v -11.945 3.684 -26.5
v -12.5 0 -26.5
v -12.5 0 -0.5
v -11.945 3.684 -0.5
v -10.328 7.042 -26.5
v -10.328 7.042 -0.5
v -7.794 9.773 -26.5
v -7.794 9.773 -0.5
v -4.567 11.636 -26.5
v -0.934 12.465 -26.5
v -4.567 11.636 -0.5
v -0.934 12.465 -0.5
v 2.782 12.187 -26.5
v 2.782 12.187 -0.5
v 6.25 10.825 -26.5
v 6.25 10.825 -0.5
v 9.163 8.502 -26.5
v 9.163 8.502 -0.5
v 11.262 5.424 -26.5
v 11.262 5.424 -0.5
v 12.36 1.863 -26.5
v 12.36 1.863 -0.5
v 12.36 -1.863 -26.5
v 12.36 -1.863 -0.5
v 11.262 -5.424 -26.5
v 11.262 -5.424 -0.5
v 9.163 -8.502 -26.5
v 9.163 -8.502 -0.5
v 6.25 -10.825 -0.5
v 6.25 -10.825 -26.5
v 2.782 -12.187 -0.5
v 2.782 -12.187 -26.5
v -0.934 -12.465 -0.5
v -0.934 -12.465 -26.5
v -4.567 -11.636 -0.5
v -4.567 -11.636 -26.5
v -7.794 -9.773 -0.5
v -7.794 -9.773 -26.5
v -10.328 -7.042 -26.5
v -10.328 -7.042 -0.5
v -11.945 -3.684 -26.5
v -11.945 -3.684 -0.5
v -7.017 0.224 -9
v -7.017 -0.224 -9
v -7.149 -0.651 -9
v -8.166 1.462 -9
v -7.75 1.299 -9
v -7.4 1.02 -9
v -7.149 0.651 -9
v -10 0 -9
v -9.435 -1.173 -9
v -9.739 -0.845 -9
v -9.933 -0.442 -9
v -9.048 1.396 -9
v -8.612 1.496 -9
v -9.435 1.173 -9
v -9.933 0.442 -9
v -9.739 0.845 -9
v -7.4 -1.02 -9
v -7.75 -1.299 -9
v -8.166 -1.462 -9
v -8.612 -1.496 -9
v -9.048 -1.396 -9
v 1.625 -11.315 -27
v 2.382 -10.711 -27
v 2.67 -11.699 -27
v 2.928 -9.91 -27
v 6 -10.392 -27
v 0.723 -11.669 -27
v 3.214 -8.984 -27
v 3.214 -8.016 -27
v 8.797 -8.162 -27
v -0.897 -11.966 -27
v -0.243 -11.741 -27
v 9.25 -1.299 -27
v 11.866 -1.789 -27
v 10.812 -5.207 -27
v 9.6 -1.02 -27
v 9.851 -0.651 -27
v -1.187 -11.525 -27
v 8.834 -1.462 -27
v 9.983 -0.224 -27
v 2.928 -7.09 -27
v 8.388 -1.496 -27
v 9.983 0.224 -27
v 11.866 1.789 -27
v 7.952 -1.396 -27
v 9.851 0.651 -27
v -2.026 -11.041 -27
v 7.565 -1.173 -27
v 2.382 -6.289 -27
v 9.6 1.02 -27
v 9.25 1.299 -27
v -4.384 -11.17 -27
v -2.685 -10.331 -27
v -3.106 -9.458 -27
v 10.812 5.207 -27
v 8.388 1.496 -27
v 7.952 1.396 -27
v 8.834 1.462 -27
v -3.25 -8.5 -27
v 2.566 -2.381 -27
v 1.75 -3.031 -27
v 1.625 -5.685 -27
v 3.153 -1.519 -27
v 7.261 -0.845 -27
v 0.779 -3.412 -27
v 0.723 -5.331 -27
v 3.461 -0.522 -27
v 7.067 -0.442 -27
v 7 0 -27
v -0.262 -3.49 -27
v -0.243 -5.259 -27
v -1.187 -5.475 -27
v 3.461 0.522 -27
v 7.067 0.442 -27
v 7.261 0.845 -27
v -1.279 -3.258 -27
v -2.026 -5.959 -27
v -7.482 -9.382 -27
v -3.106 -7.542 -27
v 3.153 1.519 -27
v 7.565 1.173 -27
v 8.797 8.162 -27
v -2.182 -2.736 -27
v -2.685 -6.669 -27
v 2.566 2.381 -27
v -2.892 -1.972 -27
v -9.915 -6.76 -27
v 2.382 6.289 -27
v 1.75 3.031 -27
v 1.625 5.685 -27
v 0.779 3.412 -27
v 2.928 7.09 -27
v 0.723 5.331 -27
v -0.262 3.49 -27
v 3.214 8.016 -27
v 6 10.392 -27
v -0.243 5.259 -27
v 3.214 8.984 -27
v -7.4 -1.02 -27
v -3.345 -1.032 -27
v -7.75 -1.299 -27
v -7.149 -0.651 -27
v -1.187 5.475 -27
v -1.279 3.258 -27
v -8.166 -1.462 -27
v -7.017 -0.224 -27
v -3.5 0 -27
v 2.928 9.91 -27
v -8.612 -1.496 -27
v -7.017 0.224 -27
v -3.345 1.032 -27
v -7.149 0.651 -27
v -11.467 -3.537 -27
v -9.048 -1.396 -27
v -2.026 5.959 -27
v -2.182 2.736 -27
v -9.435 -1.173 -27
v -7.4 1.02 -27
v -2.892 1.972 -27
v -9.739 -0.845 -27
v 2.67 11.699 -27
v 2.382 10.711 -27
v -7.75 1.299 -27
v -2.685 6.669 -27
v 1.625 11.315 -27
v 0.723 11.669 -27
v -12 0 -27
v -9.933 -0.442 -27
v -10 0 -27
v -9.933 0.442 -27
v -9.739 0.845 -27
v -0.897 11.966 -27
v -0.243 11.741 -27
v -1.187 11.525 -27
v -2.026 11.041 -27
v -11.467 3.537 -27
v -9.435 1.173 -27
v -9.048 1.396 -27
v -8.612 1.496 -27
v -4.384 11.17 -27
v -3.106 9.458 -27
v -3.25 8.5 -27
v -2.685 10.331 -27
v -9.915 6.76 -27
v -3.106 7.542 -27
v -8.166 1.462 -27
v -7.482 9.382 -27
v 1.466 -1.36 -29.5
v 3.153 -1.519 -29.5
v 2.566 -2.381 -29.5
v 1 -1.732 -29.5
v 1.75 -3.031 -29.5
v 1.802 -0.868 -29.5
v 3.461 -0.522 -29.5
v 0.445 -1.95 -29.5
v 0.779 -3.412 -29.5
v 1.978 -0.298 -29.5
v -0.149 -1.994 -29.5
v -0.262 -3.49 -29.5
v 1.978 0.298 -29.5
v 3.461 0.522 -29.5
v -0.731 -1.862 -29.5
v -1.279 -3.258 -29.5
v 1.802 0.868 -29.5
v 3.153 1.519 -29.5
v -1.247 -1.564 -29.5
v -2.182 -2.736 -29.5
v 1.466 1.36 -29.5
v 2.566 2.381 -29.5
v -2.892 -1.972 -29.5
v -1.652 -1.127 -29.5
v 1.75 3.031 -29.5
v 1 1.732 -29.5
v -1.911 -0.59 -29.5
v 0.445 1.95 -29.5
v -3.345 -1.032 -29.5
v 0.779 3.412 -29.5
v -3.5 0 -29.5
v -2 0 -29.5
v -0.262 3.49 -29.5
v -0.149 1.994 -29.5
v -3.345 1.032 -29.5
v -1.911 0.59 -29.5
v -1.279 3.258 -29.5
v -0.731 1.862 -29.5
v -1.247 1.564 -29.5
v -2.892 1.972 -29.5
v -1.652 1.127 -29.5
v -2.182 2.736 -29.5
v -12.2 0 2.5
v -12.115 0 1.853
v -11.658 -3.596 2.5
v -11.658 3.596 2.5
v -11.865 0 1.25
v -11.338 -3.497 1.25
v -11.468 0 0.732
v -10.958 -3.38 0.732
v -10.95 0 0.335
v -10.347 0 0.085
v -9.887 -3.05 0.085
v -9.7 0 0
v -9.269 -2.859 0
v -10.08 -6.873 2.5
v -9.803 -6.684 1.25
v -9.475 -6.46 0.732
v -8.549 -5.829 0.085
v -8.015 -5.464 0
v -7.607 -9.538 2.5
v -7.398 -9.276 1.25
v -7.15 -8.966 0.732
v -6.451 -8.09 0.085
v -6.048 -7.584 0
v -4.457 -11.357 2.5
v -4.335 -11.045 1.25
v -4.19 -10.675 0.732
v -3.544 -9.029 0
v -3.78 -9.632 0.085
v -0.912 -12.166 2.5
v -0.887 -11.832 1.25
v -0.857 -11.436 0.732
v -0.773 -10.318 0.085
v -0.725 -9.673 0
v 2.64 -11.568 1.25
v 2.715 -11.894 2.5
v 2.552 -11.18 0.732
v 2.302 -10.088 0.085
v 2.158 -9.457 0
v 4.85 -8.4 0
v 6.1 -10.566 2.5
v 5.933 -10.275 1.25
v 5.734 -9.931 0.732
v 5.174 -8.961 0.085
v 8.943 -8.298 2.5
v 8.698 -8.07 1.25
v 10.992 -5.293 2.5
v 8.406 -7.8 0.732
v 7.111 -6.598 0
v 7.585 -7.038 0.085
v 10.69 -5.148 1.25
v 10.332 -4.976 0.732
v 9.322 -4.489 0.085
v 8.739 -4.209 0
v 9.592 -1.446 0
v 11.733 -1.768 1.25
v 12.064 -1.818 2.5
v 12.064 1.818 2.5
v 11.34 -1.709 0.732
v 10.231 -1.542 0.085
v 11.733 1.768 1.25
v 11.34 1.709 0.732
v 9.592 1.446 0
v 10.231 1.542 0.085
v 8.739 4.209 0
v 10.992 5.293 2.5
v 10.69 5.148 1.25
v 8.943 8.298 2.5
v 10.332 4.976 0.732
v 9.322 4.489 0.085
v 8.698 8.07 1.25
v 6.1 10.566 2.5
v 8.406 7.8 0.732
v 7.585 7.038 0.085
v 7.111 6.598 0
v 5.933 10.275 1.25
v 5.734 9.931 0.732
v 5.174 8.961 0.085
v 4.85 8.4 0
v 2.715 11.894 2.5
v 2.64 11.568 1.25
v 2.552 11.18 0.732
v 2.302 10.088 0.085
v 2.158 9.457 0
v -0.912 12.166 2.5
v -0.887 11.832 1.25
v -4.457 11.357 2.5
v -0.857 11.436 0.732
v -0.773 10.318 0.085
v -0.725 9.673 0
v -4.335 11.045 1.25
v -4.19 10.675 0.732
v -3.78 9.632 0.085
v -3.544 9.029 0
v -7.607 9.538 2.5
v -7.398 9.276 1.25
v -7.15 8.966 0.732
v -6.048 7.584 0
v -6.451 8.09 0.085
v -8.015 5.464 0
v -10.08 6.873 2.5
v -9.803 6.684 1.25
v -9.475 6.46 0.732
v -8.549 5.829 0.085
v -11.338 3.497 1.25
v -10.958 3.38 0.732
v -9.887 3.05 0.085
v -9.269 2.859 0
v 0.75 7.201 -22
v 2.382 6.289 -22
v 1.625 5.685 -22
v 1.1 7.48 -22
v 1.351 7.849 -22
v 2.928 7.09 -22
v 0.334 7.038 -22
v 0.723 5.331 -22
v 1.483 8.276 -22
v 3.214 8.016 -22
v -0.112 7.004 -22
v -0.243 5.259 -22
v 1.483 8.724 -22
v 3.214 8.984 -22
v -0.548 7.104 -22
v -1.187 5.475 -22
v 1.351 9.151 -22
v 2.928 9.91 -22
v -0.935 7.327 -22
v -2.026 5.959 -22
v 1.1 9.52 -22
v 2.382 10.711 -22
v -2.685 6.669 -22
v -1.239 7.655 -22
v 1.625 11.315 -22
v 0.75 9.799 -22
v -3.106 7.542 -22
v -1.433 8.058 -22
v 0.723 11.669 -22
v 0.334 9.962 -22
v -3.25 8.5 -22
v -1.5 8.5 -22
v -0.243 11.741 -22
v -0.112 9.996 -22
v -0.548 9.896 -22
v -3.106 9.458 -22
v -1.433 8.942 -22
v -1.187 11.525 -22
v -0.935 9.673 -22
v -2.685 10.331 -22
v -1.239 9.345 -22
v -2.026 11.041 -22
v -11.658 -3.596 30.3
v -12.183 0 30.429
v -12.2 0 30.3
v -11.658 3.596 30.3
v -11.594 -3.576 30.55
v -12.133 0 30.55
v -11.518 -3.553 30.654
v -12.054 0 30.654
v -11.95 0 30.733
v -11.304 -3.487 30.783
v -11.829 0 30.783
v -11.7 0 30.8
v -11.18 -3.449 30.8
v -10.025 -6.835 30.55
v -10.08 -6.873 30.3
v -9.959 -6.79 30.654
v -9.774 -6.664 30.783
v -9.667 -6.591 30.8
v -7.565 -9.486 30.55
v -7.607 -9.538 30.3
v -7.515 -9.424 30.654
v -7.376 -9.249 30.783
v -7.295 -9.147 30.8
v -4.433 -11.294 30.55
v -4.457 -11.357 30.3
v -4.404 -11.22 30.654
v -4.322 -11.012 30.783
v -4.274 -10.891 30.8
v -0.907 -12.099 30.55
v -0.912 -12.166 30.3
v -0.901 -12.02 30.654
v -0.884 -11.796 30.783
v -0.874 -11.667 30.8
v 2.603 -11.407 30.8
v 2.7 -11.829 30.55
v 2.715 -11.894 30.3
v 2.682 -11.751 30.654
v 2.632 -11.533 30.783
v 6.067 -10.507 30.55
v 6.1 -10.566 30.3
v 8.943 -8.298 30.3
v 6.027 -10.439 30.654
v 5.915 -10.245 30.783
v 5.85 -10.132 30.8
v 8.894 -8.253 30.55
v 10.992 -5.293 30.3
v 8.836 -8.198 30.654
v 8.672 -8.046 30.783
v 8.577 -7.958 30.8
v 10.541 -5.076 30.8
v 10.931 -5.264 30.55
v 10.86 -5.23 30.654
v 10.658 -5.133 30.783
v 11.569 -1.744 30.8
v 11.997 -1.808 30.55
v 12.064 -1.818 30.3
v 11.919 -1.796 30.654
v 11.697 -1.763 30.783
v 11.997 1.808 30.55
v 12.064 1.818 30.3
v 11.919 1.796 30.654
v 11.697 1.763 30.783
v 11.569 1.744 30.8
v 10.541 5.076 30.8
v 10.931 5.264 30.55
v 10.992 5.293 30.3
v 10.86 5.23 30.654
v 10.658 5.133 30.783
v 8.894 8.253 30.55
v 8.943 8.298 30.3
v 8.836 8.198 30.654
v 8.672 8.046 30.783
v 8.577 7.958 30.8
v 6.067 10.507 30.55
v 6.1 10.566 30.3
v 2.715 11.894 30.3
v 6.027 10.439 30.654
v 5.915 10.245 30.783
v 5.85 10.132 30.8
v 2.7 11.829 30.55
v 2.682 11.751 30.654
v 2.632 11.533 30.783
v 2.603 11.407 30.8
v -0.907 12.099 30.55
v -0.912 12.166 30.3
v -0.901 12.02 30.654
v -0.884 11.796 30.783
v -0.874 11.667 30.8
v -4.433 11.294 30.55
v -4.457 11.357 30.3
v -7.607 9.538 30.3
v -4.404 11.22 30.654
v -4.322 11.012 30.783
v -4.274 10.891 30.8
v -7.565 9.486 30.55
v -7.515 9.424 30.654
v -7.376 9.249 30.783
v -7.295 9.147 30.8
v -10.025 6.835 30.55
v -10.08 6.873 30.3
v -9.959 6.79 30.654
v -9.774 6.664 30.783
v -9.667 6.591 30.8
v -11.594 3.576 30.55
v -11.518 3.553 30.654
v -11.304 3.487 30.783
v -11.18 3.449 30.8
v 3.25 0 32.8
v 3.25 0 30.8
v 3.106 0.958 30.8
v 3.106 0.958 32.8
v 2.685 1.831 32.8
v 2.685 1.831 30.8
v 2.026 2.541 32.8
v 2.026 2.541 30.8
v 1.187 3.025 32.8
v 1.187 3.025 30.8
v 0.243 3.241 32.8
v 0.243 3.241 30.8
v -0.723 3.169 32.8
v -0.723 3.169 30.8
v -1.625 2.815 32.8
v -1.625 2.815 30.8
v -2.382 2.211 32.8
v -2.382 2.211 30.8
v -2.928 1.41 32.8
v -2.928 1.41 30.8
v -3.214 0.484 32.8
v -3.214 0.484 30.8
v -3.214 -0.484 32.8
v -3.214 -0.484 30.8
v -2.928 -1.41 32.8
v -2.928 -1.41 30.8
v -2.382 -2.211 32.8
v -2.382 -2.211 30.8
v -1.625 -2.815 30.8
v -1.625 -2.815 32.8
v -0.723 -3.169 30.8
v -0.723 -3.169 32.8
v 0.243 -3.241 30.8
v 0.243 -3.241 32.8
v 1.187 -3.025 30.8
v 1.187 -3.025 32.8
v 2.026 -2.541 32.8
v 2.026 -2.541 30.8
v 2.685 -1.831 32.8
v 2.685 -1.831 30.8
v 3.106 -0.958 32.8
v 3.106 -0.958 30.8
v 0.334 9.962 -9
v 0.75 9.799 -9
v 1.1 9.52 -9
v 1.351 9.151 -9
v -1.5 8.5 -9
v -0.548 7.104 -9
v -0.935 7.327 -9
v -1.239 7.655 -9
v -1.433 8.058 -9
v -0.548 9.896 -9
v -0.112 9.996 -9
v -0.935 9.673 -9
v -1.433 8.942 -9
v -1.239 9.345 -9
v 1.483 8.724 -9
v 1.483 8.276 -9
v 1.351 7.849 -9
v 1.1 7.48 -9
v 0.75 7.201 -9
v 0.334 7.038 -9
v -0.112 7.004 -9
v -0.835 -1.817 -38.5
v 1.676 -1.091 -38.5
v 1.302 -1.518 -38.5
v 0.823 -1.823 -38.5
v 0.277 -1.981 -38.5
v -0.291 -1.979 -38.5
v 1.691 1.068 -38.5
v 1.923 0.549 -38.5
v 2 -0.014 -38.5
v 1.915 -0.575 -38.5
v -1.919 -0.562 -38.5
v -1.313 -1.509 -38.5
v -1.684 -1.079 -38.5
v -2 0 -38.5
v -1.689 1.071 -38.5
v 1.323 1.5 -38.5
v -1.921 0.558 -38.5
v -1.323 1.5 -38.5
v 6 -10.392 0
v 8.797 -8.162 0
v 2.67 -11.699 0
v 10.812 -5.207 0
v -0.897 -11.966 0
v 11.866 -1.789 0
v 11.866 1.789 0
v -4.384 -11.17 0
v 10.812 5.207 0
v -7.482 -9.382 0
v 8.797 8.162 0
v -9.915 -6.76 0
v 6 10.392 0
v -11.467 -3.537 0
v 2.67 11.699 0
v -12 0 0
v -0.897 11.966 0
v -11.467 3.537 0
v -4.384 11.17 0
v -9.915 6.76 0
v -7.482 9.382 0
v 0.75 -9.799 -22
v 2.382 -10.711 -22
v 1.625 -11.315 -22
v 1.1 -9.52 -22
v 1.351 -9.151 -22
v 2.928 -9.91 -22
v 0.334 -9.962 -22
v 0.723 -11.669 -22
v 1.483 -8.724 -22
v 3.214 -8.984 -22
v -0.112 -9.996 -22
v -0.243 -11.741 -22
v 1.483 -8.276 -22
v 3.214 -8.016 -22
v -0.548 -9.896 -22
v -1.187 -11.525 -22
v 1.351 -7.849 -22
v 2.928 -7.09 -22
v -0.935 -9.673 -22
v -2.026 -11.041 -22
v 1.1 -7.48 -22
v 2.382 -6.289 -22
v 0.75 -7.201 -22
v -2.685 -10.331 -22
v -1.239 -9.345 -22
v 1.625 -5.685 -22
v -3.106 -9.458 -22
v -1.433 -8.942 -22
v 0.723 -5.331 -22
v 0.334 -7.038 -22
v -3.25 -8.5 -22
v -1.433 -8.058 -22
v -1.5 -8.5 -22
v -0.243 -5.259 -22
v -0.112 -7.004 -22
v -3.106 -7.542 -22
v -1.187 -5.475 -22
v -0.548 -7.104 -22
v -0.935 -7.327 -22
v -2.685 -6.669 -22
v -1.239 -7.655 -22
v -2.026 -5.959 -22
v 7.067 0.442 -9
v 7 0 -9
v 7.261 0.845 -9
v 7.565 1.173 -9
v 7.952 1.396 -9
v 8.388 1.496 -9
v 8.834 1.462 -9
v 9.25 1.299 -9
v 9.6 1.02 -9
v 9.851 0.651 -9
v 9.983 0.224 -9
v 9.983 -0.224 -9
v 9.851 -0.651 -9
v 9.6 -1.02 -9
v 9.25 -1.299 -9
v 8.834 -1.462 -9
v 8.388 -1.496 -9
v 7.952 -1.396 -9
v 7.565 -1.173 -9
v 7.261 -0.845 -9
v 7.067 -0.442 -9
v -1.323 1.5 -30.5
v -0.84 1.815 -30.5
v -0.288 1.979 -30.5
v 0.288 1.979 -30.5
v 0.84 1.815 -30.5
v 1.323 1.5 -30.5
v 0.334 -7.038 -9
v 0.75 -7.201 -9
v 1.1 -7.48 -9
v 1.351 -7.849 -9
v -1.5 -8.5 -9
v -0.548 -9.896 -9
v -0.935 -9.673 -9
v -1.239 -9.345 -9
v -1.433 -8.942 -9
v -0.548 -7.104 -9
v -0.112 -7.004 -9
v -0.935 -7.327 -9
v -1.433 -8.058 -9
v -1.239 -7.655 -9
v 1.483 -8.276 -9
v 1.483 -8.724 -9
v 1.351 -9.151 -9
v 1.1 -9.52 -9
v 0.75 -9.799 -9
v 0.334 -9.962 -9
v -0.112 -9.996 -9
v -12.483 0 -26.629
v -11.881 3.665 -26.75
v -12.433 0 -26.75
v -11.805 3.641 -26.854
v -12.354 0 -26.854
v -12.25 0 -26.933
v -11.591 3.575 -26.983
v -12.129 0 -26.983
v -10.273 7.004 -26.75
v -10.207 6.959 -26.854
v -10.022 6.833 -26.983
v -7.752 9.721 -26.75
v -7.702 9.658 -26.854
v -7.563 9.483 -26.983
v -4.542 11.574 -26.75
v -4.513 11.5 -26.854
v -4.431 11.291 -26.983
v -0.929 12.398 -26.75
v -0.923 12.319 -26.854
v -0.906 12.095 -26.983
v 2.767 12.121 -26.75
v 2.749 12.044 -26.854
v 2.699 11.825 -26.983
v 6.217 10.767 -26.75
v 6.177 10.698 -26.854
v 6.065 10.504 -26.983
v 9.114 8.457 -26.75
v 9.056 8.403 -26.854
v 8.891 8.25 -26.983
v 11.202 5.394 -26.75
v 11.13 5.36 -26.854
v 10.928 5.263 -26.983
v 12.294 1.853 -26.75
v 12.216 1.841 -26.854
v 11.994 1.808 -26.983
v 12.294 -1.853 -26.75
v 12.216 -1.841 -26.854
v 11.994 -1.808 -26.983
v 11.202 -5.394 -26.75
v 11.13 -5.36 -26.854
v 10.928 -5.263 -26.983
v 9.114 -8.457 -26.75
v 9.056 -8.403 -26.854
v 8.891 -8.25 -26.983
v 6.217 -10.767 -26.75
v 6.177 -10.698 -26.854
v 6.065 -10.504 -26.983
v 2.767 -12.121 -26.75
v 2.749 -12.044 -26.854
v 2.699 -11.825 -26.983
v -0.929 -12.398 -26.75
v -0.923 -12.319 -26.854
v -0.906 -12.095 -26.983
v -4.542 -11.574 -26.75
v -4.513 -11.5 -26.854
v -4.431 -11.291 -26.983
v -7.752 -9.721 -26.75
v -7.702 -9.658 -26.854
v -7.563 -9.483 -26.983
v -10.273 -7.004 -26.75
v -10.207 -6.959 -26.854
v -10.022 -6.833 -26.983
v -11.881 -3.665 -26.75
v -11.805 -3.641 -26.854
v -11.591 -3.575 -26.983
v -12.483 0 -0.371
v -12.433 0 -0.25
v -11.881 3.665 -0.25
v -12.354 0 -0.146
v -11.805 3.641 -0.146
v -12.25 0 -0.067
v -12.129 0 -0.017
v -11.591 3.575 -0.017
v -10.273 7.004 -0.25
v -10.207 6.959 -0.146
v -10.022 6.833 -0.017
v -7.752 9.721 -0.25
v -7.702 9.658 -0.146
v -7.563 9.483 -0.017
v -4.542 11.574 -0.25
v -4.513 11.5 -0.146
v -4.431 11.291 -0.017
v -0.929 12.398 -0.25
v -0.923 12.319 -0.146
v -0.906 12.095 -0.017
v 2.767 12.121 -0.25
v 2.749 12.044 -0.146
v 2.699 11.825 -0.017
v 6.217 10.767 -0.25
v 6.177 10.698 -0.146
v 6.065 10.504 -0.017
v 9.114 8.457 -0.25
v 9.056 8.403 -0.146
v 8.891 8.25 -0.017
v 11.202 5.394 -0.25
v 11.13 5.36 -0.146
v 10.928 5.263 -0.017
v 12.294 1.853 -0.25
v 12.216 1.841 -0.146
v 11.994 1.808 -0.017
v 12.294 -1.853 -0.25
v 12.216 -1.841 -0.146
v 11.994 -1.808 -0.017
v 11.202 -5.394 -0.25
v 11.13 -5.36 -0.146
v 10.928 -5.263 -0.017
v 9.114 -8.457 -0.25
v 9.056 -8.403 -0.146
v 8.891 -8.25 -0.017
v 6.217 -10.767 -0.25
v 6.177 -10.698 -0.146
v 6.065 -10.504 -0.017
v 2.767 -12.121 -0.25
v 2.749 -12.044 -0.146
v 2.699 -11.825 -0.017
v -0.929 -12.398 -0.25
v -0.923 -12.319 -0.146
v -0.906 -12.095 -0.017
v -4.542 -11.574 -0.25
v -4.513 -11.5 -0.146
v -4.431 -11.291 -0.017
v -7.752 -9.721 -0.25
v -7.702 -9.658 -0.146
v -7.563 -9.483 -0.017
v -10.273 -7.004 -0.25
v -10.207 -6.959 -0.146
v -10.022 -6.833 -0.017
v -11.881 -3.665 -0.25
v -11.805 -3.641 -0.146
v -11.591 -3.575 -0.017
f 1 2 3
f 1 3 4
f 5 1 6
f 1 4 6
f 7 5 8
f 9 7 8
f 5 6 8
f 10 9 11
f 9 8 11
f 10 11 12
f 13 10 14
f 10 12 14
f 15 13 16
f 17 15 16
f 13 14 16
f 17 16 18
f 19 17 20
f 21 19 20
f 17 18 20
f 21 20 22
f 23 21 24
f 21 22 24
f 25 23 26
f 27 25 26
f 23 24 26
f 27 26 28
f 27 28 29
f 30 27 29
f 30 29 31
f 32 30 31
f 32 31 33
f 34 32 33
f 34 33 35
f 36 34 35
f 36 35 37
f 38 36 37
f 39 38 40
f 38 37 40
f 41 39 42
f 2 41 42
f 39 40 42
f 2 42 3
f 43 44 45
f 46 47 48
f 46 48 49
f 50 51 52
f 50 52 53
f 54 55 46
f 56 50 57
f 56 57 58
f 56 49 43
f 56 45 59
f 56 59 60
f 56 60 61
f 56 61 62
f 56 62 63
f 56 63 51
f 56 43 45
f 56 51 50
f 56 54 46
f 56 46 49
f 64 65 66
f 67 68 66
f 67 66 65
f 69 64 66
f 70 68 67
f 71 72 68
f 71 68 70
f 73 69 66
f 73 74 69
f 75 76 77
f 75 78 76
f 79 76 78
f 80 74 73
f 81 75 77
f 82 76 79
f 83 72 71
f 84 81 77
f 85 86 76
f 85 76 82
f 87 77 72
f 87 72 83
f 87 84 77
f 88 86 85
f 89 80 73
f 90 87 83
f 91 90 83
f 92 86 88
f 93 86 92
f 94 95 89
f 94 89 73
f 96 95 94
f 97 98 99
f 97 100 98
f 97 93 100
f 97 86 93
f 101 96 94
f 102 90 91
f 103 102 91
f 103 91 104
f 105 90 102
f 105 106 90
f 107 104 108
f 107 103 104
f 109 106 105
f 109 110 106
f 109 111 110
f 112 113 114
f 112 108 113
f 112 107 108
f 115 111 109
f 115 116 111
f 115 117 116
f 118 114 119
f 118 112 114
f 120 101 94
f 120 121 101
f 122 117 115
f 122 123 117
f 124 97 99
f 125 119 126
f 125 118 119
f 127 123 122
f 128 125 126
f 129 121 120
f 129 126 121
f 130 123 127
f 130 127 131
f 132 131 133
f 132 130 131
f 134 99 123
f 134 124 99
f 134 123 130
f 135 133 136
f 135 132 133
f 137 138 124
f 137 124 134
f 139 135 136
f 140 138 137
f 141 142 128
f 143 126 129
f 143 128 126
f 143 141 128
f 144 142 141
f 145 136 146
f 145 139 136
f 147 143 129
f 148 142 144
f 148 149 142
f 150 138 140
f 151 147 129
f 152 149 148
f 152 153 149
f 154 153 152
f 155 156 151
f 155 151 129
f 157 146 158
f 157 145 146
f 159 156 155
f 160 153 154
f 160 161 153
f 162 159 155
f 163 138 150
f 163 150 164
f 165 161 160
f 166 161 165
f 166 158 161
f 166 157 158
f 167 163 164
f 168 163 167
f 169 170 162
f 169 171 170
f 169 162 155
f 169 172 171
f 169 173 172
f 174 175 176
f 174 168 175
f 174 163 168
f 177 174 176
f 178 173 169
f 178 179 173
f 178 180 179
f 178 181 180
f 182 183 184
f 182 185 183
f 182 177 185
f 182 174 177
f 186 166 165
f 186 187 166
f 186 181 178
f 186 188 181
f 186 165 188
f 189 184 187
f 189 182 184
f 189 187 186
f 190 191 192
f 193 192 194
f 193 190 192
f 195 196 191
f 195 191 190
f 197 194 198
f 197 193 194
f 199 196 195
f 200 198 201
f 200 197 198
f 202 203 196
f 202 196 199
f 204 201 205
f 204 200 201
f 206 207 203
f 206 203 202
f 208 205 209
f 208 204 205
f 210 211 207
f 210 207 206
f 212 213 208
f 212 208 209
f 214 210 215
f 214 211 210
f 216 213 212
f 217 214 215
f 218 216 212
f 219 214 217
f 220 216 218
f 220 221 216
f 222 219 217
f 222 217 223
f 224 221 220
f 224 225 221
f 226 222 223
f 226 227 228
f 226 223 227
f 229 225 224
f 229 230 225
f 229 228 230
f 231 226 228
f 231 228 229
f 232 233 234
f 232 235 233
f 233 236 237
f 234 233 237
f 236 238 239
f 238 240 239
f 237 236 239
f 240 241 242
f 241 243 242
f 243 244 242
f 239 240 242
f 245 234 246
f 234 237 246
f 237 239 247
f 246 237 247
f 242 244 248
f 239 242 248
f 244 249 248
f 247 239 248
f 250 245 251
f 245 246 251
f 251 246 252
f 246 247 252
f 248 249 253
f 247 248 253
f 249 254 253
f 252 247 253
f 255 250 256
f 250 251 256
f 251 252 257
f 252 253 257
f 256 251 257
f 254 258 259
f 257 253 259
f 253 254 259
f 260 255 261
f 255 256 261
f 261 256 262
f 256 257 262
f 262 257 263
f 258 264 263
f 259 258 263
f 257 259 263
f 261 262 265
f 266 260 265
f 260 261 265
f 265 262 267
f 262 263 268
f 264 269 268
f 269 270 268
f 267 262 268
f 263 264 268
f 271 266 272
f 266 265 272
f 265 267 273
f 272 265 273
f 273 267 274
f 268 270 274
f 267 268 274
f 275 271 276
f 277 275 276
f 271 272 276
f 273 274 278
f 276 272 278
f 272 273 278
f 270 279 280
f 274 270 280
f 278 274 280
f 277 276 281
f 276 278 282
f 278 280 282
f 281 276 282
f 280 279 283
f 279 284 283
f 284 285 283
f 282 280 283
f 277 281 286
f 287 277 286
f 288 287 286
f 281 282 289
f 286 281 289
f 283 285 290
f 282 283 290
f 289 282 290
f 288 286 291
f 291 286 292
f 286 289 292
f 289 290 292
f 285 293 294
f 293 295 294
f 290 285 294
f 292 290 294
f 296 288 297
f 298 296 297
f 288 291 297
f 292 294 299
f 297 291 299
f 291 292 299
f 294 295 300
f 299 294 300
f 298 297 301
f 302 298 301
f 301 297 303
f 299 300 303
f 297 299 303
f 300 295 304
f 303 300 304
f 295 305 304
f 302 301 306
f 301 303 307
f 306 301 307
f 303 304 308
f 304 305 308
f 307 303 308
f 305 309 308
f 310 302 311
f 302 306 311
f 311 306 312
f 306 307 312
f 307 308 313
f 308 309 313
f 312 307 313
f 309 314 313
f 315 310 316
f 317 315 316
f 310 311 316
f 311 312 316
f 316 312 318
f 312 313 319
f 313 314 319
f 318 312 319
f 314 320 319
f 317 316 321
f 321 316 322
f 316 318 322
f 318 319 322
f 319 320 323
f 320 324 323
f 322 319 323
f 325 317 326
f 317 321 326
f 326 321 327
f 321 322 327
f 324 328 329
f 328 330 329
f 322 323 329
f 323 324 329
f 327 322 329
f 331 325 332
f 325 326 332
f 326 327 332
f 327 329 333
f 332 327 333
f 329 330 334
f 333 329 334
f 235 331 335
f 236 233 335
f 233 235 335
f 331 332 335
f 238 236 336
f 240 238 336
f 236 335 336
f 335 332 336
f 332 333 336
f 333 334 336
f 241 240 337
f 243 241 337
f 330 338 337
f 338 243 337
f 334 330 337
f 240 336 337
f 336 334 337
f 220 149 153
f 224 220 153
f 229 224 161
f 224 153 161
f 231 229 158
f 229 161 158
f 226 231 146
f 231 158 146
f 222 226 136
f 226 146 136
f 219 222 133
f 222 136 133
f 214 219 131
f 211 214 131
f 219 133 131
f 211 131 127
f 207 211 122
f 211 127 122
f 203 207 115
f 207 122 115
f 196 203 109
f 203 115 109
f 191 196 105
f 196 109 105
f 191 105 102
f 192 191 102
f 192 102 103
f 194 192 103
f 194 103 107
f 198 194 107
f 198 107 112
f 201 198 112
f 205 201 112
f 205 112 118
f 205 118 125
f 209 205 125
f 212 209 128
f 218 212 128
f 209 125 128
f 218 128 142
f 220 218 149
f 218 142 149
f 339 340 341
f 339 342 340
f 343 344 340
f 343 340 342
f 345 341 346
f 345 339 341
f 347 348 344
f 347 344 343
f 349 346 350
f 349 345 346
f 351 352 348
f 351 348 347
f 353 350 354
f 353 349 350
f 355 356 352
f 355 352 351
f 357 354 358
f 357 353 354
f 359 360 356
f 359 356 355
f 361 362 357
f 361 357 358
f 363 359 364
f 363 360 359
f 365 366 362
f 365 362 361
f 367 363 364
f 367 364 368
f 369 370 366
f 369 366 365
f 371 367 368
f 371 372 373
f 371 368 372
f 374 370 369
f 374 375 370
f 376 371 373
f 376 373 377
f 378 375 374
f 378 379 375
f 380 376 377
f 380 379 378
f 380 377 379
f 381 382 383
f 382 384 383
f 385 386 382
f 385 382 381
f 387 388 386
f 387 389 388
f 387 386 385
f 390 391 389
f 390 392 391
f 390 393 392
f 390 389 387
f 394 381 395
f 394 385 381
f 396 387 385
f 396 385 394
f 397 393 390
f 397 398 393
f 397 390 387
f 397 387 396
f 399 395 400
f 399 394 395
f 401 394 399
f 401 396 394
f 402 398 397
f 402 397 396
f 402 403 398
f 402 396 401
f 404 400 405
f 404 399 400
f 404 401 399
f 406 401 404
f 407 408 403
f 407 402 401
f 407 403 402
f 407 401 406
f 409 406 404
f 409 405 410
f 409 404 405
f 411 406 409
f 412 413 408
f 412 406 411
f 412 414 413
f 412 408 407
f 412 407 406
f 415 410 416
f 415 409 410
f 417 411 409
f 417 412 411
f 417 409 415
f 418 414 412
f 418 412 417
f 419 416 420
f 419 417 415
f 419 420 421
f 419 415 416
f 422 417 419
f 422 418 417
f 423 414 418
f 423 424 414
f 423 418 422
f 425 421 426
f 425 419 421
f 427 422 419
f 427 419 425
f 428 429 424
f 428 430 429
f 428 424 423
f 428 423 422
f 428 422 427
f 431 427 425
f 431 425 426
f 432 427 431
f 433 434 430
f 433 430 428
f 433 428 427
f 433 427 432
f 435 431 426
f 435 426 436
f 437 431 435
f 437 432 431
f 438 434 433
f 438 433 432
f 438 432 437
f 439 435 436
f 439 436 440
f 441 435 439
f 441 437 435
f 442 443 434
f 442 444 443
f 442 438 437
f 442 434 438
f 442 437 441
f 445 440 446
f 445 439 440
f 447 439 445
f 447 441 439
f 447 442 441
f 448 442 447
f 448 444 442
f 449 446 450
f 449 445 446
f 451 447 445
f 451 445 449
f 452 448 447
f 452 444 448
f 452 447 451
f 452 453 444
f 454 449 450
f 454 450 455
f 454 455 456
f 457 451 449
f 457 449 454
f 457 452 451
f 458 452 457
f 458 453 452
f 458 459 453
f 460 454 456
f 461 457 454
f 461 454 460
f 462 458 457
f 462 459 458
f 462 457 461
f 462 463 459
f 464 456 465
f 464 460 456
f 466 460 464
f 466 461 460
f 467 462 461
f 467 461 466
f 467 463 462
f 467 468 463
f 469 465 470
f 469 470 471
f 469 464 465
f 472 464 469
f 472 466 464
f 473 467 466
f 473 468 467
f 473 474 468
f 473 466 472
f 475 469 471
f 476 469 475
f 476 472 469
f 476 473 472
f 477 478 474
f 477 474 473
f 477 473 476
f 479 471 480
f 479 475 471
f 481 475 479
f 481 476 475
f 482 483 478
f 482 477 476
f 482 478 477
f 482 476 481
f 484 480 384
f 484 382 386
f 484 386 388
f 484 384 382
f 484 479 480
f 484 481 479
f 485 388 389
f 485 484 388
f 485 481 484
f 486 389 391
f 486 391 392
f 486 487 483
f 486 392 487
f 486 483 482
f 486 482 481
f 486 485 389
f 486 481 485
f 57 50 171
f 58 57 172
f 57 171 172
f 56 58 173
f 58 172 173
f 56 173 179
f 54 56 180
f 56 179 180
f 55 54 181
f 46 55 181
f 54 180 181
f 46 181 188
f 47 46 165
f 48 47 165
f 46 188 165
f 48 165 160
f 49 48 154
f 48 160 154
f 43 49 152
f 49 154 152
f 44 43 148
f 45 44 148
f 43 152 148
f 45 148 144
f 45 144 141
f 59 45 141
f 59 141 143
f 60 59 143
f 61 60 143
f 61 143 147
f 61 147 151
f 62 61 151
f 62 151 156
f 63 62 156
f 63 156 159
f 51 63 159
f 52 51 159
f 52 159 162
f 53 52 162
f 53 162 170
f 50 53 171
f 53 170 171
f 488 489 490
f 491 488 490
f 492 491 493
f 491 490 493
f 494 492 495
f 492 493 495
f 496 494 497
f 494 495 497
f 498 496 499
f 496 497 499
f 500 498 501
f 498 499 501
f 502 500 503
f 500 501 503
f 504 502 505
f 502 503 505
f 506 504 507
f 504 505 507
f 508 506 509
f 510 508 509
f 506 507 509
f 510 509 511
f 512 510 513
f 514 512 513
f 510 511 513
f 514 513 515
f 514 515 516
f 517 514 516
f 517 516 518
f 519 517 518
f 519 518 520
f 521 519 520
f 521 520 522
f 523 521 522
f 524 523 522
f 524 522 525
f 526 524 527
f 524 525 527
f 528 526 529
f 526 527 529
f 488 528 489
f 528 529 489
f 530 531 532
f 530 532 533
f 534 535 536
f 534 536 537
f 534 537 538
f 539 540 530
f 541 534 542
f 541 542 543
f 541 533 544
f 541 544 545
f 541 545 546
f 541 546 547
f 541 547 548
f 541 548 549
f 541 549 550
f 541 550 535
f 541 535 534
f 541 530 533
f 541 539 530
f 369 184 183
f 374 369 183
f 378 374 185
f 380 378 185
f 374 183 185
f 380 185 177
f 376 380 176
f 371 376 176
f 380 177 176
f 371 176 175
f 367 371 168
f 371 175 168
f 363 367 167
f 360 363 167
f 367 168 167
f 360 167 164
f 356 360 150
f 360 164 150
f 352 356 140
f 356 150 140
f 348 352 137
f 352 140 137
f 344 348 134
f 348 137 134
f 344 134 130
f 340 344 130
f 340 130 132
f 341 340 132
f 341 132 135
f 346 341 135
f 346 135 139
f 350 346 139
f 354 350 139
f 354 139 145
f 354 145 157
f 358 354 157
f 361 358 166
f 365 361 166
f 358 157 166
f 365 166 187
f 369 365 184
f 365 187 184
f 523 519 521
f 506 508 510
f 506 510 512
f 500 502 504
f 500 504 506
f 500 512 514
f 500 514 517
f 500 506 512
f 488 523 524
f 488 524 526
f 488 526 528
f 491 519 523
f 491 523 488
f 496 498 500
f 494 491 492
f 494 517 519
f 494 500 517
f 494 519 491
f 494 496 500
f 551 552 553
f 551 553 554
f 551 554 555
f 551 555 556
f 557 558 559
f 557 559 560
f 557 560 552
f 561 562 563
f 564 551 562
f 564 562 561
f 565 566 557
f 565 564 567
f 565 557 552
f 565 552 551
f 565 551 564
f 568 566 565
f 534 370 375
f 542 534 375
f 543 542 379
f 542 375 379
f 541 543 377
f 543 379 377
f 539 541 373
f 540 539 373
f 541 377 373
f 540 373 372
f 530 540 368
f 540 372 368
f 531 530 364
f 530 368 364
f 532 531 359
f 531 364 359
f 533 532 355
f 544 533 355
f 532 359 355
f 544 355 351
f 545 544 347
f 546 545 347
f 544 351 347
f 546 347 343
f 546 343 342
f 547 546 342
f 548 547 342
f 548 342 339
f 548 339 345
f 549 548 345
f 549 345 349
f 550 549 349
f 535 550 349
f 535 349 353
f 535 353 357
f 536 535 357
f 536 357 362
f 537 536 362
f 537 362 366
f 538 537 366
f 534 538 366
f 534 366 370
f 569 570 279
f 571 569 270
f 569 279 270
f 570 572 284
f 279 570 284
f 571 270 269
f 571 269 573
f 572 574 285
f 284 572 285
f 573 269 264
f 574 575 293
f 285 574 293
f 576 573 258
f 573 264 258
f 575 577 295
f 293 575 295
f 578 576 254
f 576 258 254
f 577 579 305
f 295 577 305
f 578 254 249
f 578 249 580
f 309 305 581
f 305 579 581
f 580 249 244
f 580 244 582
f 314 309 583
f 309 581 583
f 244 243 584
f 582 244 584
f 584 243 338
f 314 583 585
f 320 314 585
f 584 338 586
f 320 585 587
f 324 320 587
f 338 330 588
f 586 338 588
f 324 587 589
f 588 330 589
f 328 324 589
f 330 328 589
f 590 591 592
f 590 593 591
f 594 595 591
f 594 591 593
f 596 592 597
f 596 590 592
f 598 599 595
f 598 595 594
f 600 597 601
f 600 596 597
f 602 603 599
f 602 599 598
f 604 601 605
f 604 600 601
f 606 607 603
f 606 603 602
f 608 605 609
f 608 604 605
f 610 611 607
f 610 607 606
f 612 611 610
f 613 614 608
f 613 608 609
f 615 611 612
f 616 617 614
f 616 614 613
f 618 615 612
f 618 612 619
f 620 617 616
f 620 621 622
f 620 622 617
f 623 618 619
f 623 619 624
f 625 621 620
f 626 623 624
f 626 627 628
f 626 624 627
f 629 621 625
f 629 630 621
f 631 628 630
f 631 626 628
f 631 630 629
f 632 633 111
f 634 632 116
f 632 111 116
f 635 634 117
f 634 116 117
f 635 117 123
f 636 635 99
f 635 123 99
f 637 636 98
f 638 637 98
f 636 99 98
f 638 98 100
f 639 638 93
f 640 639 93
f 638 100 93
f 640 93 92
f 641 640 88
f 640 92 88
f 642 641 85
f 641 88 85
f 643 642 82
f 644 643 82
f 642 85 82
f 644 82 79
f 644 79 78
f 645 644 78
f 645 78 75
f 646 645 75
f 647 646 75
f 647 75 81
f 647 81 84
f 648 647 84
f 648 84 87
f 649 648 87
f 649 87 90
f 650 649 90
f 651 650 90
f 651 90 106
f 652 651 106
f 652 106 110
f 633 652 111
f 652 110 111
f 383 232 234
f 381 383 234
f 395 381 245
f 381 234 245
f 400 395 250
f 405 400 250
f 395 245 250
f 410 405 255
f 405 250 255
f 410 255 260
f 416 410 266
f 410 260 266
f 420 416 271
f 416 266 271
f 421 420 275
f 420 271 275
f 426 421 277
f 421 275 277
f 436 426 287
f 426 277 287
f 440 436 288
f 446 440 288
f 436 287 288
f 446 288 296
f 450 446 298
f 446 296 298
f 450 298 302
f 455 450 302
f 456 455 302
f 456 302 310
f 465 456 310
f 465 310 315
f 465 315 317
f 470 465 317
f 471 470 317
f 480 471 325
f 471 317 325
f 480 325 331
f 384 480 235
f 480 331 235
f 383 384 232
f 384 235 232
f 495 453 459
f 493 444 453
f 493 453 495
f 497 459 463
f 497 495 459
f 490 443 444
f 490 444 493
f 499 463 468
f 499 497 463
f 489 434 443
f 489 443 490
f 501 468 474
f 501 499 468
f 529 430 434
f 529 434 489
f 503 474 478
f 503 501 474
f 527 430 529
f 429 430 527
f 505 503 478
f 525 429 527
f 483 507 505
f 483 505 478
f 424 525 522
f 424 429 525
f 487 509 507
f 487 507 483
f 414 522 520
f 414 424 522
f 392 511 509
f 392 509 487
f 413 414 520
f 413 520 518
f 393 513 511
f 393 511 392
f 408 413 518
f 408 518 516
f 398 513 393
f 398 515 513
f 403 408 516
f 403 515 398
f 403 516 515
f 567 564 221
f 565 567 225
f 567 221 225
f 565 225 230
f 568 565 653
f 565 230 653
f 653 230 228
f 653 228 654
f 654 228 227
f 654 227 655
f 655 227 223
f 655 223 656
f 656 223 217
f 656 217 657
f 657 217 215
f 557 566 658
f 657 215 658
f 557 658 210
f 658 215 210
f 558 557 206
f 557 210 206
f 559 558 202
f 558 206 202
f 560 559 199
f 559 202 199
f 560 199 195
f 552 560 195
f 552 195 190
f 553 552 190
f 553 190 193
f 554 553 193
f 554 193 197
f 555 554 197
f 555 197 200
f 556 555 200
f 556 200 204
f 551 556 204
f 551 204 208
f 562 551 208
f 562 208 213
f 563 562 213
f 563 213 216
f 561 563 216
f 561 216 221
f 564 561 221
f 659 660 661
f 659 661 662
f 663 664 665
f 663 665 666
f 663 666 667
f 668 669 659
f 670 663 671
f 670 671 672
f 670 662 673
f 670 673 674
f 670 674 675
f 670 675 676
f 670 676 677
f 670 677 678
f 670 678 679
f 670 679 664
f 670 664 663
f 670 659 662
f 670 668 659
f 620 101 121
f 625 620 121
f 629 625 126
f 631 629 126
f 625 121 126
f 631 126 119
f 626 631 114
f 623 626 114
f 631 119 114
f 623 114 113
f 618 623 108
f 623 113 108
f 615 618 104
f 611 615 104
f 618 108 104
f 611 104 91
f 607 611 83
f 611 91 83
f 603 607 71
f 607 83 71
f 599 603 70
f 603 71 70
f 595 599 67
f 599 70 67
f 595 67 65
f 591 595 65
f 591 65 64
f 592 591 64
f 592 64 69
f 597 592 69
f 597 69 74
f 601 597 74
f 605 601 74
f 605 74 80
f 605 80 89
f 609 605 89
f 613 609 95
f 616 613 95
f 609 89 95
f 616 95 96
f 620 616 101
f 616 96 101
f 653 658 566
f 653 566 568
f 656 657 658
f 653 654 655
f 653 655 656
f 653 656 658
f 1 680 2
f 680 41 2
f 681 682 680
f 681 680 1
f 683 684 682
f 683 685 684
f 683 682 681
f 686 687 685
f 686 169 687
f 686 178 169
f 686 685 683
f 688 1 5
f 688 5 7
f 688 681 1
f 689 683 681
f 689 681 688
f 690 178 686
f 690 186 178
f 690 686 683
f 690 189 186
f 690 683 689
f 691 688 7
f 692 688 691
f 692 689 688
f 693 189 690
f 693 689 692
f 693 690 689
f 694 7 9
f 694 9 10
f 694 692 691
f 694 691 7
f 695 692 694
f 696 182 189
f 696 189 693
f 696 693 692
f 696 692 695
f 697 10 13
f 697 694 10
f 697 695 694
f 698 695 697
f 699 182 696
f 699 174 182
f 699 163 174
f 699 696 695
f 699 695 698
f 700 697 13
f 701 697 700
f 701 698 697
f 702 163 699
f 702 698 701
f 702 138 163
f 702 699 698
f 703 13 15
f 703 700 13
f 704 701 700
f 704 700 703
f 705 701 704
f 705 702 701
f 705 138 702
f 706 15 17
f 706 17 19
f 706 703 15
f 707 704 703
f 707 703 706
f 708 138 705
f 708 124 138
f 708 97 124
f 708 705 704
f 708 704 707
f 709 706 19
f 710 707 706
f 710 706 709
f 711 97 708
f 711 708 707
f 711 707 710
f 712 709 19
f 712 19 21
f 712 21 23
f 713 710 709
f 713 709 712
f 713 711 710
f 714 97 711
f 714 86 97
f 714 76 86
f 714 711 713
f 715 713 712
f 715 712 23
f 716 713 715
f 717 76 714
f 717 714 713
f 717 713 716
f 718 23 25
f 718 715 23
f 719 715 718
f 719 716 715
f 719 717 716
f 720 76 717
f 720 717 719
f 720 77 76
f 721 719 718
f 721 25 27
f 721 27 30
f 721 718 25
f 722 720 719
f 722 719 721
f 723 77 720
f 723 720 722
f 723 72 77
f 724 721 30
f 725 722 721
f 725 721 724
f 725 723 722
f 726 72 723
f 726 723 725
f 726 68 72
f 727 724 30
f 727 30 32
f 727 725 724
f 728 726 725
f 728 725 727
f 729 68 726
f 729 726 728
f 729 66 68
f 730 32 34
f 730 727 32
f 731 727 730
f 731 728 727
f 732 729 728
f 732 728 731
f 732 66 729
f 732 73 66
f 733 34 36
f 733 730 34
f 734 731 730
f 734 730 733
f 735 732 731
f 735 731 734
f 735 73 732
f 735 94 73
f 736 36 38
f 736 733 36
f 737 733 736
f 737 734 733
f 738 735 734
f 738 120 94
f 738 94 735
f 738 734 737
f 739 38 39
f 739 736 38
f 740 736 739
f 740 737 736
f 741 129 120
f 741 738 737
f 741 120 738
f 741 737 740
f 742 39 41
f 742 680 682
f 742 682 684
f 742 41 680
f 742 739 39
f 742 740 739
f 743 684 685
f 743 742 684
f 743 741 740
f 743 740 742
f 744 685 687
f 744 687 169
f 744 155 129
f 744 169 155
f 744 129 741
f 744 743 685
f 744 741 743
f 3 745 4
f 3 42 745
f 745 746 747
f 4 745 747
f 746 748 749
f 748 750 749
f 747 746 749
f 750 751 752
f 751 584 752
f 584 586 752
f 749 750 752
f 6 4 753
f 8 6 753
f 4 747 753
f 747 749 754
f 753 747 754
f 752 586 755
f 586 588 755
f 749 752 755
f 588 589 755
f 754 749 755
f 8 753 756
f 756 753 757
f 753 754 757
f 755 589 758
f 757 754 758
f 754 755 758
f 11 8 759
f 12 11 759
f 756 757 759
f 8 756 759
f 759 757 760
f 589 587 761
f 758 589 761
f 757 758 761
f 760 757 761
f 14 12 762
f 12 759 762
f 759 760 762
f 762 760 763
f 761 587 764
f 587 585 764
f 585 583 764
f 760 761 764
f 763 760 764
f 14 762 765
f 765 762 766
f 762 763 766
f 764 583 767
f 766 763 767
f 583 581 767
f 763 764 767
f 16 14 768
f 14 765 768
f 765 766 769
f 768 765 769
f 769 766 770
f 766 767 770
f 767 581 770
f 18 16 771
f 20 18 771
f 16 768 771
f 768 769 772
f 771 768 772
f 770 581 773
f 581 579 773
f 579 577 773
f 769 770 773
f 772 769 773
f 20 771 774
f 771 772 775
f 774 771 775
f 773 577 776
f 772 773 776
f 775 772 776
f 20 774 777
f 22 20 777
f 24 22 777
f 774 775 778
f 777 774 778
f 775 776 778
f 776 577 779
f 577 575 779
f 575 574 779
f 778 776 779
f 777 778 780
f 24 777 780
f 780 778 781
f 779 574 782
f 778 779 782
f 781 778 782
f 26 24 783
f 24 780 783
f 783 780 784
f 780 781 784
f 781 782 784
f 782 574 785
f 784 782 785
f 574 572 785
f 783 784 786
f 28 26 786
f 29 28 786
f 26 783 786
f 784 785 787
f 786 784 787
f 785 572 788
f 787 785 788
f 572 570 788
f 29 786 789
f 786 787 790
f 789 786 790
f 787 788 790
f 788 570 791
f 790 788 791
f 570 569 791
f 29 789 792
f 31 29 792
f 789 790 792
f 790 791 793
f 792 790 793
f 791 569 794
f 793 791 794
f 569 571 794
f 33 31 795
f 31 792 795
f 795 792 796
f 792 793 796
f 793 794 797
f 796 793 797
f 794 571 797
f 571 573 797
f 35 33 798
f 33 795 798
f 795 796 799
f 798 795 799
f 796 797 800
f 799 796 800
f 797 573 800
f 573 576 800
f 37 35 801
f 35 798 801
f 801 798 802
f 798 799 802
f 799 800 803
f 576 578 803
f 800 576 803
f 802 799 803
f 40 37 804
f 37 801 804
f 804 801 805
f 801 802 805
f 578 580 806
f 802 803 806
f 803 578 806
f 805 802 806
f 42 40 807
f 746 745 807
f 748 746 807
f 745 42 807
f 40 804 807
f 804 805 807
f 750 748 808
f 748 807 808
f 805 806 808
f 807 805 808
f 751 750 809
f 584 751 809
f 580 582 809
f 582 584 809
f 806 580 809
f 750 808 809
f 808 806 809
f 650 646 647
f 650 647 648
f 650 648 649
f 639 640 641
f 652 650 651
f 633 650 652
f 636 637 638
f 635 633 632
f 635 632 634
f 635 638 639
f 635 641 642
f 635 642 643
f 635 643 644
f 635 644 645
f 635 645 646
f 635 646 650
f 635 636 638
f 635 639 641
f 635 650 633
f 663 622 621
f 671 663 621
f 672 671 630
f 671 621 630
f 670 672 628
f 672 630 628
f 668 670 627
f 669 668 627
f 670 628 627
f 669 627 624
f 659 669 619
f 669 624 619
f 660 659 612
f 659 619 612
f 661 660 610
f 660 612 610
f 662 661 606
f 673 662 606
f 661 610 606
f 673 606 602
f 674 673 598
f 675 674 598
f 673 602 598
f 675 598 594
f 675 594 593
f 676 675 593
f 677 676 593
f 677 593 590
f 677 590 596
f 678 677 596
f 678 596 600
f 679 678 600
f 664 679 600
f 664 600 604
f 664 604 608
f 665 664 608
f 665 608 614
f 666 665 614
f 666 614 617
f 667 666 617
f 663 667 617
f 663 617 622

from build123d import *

# Parameters (mm, degrees)
SKETCH_1_R          = 12.2
EXTRUDE_1_DEPTH     = 30.8
SKETCH_2_R          = 3.25
EXTRUDE_2_DEPTH     = 2
FILLET_1_R          = 2.5
SKETCH_3_R          = 12.5
EXTRUDE_3_DEPTH     = 27
SKETCH_4_R          = 3.5
EXTRUDE_4_DEPTH     = 2.5
SKETCH_5_R          = 2
EXTRUDE_5_DEPTH     = 9
CUT_EXTRUDE_START   = -8
CUT_EXTRUDE_1_DEPTH = 8
SKETCH_7_R          = 1.5
CUT_EXTRUDE_2_DEPTH = 18
FILLET_2_R          = 0.5
SKETCH_8_R          = 3.25
CUT_EXTRUDE_3_DEPTH = 5


with BuildPart() as part:
    # ｽｹｯﾁ1 → ﾎﾞｽ - 押し出し1 (new body)
    with BuildSketch(Plane.XY):
        with Locations(Location((0, 0, 0), (0, 0, 180))):
            Circle(SKETCH_1_R)
    extrude(amount=EXTRUDE_1_DEPTH)

    # ｽｹｯﾁ2 → ﾎﾞｽ - 押し出し2 (add)
    with BuildSketch(Plane.XY.offset(30.8)):
        Circle(SKETCH_2_R)
    extrude(amount=EXTRUDE_2_DEPTH)

    # ﾌｨﾚｯﾄ1
    fillet_1_edges = [part.edges().sort_by_distance(p)[0] for p in [
        (12.2, 0, 0),
    ]]
    fillet(fillet_1_edges, radius=FILLET_1_R)

    # ｽｹｯﾁ3 → ﾎﾞｽ - 押し出し3 (add)
    with BuildSketch(Plane(origin=(0, 0, 0), x_dir=(-1, 0, 0), z_dir=(0, 0, -1))):
        Circle(SKETCH_3_R)
    extrude(amount=EXTRUDE_3_DEPTH)

    # ｽｹｯﾁ4 → ﾎﾞｽ - 押し出し4 (add)
    with BuildSketch(Plane(origin=(0, 0, -27), x_dir=(-1, 0, 0), z_dir=(0, 0, -1))):
        Circle(SKETCH_4_R)
    extrude(amount=EXTRUDE_4_DEPTH)

    # ｽｹｯﾁ5 → ﾎﾞｽ - 押し出し5 (add)
    with BuildSketch(Plane(origin=(0, 0, -29.5), x_dir=(-1, 0, 0), z_dir=(0, 0, -1))):
        Circle(SKETCH_5_R)
    extrude(amount=EXTRUDE_5_DEPTH)

    # ｽｹｯﾁ6 → ｶｯﾄ - 押し出し1 (cut)
    with BuildSketch(Plane(origin=(0, 0, -38.5), x_dir=(-1, 0, 0), z_dir=(0, 0, -1)).offset(CUT_EXTRUDE_START)):
        with BuildLine():
            Line((-1.322875656, 1.5), (1.322875656, 1.5))
            ThreePointArc((1.322875656, 1.5), (0, 2), (-1.322875656, 1.5))
        make_face()
    extrude(amount=CUT_EXTRUDE_1_DEPTH, mode=Mode.SUBTRACT)

    # ｽｹｯﾁ7 → ｶｯﾄ - 押し出し2 (cut)
    with BuildSketch(Plane(origin=(0, 0, -27), x_dir=(-1, 0, 0), z_dir=(0, 0, -1))):
        with Locations((0, 8.5)):
            Circle(SKETCH_7_R)
        with Locations((8.5, 0)):
            Circle(SKETCH_7_R)
        with Locations((0, -8.5)):
            Circle(SKETCH_7_R)
        with Locations((-8.5, 0)):
            Circle(SKETCH_7_R)
    extrude(amount=-CUT_EXTRUDE_2_DEPTH, mode=Mode.SUBTRACT)

    # ﾌｨﾚｯﾄ2
    fillet_2_edges = [part.edges().sort_by_distance(p)[0] for p in [
        (12.5, 0, 0),
        (12.5, 0, -27),
        (12.2, 0, 30.8),
    ]]
    fillet(fillet_2_edges, radius=FILLET_2_R)

    # ｽｹｯﾁ8 → ｶｯﾄ - 押し出し3 (cut)
    with BuildSketch(Plane(origin=(0, 0, -27), x_dir=(-1, 0, 0), z_dir=(0, 0, -1))):
        with Locations((0, 8.5)):
            Circle(SKETCH_8_R)
        with Locations((0, -8.5)):
            Circle(SKETCH_8_R)
    extrude(amount=-CUT_EXTRUDE_3_DEPTH, mode=Mode.SUBTRACT)


solid = part.part
